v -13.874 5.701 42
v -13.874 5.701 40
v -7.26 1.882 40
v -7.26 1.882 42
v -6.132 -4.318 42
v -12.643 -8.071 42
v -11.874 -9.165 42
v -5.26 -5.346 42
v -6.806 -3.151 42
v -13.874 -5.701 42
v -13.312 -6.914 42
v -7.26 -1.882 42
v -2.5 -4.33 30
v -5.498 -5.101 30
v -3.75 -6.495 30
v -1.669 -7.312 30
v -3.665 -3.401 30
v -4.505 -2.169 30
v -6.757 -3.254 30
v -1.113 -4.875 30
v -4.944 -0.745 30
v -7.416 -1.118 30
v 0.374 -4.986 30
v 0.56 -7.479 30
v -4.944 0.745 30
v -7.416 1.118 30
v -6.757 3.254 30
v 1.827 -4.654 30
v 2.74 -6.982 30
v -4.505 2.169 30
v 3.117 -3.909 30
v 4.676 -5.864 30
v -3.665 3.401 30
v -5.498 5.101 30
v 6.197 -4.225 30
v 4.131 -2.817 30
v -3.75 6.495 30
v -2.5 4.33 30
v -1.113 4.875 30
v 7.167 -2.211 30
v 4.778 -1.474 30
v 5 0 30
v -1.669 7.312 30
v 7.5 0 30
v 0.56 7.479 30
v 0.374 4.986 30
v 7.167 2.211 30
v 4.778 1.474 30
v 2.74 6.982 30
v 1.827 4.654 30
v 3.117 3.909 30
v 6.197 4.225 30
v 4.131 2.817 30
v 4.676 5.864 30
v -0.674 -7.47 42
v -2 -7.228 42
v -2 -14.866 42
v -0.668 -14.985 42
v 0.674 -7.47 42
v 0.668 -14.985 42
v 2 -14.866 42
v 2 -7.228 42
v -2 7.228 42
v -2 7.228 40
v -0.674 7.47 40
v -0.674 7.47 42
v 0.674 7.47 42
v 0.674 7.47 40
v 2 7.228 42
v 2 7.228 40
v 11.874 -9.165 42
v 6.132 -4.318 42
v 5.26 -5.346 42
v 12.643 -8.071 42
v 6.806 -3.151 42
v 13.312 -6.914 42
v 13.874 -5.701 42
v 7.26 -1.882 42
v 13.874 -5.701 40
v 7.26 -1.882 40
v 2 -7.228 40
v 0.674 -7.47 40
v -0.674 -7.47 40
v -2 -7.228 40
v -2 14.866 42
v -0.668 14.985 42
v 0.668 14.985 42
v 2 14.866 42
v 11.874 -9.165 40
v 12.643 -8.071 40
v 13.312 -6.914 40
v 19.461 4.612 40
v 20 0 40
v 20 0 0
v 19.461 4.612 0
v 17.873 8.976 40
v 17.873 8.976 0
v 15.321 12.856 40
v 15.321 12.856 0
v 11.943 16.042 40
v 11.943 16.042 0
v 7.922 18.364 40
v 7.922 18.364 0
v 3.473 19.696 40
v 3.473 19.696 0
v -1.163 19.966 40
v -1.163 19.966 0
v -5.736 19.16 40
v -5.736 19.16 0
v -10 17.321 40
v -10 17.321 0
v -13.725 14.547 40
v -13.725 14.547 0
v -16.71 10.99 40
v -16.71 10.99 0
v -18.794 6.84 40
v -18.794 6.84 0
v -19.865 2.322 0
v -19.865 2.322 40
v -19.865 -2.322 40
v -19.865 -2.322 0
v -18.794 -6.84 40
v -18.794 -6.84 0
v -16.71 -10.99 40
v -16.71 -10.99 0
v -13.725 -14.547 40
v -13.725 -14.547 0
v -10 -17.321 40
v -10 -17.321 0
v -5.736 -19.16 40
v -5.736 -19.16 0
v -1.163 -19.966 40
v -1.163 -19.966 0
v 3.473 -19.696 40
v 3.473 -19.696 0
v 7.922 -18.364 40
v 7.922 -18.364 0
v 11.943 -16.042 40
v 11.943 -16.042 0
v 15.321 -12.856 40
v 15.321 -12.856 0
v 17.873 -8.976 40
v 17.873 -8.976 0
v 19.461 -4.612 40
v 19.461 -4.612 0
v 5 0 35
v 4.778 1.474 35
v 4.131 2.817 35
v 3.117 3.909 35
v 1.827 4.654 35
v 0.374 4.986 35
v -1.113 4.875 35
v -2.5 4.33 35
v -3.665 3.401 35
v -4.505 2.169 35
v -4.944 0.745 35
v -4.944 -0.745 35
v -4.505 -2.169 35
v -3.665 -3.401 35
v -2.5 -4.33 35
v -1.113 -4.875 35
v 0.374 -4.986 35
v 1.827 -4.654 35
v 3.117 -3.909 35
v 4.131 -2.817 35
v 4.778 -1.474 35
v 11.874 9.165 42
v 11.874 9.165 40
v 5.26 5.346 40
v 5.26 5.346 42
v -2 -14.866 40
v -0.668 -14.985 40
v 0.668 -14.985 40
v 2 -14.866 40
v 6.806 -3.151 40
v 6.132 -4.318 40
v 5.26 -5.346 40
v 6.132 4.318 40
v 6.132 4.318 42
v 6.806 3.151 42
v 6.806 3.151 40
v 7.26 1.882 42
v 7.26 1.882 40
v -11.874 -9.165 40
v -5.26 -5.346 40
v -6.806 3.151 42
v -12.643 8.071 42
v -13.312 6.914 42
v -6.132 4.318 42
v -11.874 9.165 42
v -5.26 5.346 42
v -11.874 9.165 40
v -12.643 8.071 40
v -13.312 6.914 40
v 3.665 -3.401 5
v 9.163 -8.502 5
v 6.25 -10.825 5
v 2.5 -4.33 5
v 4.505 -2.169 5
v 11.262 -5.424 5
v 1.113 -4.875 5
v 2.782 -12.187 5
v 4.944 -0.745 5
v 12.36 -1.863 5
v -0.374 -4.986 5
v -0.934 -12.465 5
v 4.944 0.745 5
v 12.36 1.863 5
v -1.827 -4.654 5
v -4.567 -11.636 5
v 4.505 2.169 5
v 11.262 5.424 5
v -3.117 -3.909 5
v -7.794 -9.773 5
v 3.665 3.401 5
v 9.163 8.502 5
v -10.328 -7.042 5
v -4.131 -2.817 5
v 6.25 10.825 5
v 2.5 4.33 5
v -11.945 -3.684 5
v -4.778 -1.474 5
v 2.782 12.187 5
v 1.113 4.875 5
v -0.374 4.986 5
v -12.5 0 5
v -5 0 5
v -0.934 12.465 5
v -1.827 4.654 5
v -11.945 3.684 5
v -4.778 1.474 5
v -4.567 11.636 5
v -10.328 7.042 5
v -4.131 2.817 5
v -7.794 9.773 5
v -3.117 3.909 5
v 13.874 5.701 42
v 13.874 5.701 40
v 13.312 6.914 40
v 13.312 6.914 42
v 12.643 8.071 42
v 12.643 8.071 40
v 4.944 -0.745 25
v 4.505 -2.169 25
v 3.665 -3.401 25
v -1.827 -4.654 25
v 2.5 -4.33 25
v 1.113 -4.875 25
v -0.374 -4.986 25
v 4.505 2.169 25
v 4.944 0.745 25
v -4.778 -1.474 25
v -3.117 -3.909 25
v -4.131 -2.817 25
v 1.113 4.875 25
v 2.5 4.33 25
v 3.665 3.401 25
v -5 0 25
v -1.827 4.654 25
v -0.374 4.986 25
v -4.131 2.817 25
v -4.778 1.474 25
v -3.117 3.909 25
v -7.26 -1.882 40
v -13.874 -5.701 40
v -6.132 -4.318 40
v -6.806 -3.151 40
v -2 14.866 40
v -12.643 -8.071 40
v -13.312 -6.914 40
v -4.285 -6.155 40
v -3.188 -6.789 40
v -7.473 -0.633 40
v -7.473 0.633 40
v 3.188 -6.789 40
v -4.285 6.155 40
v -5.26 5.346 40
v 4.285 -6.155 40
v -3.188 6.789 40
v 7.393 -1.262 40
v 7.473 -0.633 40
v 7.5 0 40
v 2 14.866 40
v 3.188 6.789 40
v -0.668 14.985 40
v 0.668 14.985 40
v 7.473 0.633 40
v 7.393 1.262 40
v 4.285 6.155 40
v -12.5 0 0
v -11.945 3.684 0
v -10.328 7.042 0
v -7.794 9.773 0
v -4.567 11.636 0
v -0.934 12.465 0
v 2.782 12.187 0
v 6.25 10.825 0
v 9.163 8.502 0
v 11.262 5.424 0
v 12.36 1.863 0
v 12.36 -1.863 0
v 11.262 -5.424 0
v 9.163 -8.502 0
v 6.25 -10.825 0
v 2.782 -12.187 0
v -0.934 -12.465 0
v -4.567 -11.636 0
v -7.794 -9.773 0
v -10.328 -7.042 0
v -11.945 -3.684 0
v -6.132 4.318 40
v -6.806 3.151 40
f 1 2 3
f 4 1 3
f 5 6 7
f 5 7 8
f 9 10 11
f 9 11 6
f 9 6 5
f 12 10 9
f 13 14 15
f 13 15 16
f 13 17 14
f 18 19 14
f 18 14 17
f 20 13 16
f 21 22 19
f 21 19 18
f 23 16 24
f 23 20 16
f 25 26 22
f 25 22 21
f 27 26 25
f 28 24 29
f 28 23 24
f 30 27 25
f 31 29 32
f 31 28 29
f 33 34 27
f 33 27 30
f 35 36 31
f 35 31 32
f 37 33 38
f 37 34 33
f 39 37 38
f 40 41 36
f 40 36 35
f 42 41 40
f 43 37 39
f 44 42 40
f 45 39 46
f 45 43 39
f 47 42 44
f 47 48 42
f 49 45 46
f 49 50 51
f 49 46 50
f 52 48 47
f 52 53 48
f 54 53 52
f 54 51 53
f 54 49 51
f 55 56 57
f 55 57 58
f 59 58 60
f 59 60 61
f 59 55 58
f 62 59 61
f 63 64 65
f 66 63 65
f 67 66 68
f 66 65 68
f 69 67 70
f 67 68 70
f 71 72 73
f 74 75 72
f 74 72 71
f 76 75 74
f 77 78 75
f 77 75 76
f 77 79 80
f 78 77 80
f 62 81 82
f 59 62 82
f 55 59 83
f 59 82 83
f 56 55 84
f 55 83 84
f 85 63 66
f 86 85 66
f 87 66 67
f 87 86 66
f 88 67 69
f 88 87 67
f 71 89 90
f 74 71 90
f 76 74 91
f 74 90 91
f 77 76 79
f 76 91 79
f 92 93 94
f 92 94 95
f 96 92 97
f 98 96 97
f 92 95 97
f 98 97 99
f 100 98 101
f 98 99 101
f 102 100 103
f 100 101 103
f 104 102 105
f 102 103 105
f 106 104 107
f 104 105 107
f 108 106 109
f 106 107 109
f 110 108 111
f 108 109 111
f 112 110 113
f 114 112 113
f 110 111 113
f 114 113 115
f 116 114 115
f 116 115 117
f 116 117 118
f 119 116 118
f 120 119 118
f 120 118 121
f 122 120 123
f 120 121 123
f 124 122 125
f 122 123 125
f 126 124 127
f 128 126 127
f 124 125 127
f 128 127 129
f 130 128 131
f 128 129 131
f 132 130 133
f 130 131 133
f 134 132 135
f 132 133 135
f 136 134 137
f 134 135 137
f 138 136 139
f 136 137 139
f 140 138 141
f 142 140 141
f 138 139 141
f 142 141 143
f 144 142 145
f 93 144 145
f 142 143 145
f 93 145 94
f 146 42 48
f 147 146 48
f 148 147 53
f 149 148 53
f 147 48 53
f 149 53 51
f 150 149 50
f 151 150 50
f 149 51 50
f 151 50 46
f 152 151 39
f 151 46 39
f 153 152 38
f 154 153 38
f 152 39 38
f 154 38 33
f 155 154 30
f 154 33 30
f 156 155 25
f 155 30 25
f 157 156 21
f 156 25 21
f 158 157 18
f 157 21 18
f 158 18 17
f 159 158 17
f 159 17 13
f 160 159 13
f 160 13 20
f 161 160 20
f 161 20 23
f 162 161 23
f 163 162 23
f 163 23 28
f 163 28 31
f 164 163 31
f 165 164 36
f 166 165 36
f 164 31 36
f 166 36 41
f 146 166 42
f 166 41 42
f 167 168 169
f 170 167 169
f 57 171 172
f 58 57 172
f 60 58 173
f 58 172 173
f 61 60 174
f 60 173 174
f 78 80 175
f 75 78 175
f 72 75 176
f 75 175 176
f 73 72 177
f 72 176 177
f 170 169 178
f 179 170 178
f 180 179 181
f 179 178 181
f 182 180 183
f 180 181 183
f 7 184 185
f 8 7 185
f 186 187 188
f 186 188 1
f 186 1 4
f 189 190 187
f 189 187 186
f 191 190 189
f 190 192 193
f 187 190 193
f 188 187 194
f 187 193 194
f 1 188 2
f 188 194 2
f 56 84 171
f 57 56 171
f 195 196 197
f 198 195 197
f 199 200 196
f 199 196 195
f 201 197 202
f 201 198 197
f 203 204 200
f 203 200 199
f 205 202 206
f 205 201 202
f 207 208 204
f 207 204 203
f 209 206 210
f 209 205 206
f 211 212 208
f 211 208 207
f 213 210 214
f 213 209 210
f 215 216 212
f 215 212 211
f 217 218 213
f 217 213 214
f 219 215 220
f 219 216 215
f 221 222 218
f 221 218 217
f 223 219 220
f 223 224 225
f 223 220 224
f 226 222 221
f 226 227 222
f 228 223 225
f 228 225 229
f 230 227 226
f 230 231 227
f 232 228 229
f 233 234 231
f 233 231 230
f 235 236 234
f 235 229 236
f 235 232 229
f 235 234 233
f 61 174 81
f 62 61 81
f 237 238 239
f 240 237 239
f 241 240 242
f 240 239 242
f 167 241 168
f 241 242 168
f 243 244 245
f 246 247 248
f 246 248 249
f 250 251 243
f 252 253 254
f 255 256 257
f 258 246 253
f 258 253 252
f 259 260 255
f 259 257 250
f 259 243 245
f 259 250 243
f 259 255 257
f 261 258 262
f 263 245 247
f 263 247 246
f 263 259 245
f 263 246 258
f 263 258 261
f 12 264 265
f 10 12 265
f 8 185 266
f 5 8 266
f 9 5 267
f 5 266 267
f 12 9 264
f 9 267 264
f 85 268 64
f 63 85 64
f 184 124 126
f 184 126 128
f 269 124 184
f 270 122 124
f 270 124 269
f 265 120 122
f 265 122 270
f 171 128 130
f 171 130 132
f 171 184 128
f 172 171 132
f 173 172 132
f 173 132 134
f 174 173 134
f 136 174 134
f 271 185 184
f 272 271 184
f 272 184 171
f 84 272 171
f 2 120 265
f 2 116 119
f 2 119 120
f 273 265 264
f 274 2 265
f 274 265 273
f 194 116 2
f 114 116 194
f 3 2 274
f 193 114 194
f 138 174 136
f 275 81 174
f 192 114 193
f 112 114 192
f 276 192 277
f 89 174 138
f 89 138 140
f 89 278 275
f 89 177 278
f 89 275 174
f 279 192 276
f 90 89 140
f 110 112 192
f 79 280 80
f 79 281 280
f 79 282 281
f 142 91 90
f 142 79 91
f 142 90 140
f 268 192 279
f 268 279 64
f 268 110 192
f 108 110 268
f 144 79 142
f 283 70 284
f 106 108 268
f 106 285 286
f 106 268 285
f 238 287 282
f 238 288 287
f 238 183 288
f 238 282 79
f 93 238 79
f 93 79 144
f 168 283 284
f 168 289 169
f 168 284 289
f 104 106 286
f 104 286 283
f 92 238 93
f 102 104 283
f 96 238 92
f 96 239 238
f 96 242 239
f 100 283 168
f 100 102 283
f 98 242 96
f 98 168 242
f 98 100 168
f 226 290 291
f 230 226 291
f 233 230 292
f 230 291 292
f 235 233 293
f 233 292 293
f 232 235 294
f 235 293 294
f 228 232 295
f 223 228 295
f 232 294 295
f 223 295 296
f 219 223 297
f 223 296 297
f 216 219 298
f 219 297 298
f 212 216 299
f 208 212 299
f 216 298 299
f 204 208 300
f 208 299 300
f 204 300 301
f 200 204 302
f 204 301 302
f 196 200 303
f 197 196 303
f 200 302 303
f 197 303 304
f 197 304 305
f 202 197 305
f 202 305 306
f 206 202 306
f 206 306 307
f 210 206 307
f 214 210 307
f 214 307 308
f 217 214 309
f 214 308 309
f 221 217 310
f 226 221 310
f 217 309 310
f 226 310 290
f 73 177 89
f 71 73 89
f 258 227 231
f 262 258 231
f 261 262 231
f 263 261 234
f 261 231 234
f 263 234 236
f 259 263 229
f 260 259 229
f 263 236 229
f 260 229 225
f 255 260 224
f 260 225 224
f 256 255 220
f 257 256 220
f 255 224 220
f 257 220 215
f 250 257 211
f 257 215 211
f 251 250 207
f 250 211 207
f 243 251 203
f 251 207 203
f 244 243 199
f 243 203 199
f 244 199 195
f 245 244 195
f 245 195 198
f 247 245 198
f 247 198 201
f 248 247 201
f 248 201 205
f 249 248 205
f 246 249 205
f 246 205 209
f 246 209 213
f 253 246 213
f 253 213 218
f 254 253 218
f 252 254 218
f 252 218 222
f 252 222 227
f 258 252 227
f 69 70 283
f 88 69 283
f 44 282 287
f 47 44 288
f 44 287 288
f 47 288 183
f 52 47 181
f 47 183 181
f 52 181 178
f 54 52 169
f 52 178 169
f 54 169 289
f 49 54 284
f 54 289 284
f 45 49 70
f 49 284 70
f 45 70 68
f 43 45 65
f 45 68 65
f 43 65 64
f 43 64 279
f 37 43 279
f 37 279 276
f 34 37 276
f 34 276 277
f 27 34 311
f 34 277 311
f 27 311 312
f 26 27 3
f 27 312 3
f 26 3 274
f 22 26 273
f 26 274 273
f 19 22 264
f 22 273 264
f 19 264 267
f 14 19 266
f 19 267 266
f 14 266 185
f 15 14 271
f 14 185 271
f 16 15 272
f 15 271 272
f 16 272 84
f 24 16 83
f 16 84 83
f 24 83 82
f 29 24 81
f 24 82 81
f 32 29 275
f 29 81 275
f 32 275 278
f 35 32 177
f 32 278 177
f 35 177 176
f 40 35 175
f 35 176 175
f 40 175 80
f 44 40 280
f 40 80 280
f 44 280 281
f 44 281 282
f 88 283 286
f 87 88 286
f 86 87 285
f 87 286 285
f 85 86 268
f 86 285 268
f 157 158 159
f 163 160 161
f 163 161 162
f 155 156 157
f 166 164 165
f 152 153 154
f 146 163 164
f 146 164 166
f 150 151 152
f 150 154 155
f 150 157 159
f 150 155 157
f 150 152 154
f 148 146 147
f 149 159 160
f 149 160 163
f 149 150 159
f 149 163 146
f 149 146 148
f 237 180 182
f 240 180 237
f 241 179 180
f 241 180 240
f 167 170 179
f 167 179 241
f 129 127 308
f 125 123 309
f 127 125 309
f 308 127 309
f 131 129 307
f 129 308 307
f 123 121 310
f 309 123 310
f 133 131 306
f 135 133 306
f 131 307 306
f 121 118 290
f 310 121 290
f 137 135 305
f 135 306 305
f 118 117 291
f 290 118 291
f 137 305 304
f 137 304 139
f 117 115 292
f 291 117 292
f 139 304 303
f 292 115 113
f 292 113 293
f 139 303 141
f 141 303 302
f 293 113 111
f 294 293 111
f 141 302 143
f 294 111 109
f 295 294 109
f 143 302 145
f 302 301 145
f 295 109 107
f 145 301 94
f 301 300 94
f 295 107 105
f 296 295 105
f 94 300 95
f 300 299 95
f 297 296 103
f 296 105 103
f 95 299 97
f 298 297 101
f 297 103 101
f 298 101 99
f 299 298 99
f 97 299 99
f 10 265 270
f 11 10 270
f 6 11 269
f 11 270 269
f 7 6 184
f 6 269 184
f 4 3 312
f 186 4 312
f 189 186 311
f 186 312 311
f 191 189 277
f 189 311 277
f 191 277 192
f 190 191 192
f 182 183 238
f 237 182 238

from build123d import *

# Parameters (mm, degrees)
SKETCH5_R           = 20
BOSS_EXTRUDE3_DEPTH = 40
SKETCH6_R           = 7.5
CUT_EXTRUDE3_DEPTH  = 10
BOSS_EXTRUDE4_DEPTH = 2
SKETCH8_R           = 5
CUT_EXTRUDE6_DEPTH  = 25
SKETCH9_R           = 12.5
CUT_EXTRUDE7_DEPTH  = 5
SKETCH10_R          = 5
BOSS_EXTRUDE5_DEPTH = 5


with BuildPart() as part:
    # Sketch5 → Boss-Extrude3 (new body)
    with BuildSketch(Plane.XY):
        Circle(SKETCH5_R)
    extrude(amount=BOSS_EXTRUDE3_DEPTH)

    # Sketch6 → Cut-Extrude3 (cut)
    with BuildSketch(Plane.XY.offset(40)):
        Circle(SKETCH6_R)
    extrude(amount=-CUT_EXTRUDE3_DEPTH, mode=Mode.SUBTRACT)

    # Sketch7 → Boss-Extrude4 (add)
    with BuildSketch(Plane.XY.offset(40)):
        with BuildLine():
            ThreePointArc((-2, 7.228416147), (0, 7.5), (2, 7.228416147))
            Line((2, 7.228416147), (2, 14.866068747))
            ThreePointArc((2, 14.866068747), (0, 15), (-2, 14.866068747))
            Line((-2, 14.866068747), (-2, 7.228416147))
        make_face()
        with BuildLine():
            Line((11.87439319, 9.165085181), (5.259992013, 5.346258881))
            ThreePointArc((5.259992013, 5.346258881), (6.495190528, 3.75), (7.259992013, 1.882157266))
            Line((7.259992013, 1.882157266), (13.87439319, 5.700983566))
            ThreePointArc((13.87439319, 5.700983566), (12.990381057, 7.5), (11.87439319, 9.165085181))
        make_face()
        with BuildLine():
            Line((13.87439319, -5.700983566), (7.259992013, -1.882157266))
            ThreePointArc((7.259992013, -1.882157266), (6.495190528, -3.75), (5.259992013, -5.346258881))
            Line((5.259992013, -5.346258881), (11.87439319, -9.165085181))
            ThreePointArc((11.87439319, -9.165085181), (12.990381057, -7.5), (13.87439319, -5.700983566))
        make_face()
        with BuildLine():
            Line((2, -14.866068747), (2, -7.228416147))
            ThreePointArc((2, -7.228416147), (0, -7.5), (-2, -7.228416147))
            Line((-2, -7.228416147), (-2, -14.866068747))
            ThreePointArc((-2, -14.866068747), (0, -15), (2, -14.866068747))
        make_face()
        with BuildLine():
            ThreePointArc((-5.259992013, -5.346258881), (-6.495190528, -3.75), (-7.259992013, -1.882157266))
            Line((-7.259992013, -1.882157266), (-13.87439319, -5.700983566))
            ThreePointArc((-13.87439319, -5.700983566), (-12.990381057, -7.5), (-11.87439319, -9.165085181))
            Line((-11.87439319, -9.165085181), (-5.259992013, -5.346258881))
        make_face()
        with BuildLine():
            ThreePointArc((-7.259992013, 1.882157266), (-6.495190528, 3.75), (-5.259992013, 5.346258881))
            Line((-5.259992013, 5.346258881), (-11.87439319, 9.165085181))
            ThreePointArc((-11.87439319, 9.165085181), (-12.990381057, 7.5), (-13.87439319, 5.700983566))
            Line((-13.87439319, 5.700983566), (-7.259992013, 1.882157266))
        make_face()
    extrude(amount=BOSS_EXTRUDE4_DEPTH)

    # Sketch8 → Cut-Extrude6 (cut)
    with BuildSketch(Plane(origin=(0, 0, 0), x_dir=(-1, 0, 0), z_dir=(0, 0, -1))):
        Circle(SKETCH8_R)
    extrude(amount=-CUT_EXTRUDE6_DEPTH, mode=Mode.SUBTRACT)

    # Sketch9 → Cut-Extrude7 (cut)
    with BuildSketch(Plane(origin=(0, 0, 0), x_dir=(-1, 0, 0), z_dir=(0, 0, -1))):
        Circle(SKETCH9_R)
    extrude(amount=-CUT_EXTRUDE7_DEPTH, mode=Mode.SUBTRACT)

    # Sketch10 → Boss-Extrude5 (add)
    with BuildSketch(Plane.XY.offset(30)):
        Circle(SKETCH10_R)
    extrude(amount=BOSS_EXTRUDE5_DEPTH)


solid = part.part
